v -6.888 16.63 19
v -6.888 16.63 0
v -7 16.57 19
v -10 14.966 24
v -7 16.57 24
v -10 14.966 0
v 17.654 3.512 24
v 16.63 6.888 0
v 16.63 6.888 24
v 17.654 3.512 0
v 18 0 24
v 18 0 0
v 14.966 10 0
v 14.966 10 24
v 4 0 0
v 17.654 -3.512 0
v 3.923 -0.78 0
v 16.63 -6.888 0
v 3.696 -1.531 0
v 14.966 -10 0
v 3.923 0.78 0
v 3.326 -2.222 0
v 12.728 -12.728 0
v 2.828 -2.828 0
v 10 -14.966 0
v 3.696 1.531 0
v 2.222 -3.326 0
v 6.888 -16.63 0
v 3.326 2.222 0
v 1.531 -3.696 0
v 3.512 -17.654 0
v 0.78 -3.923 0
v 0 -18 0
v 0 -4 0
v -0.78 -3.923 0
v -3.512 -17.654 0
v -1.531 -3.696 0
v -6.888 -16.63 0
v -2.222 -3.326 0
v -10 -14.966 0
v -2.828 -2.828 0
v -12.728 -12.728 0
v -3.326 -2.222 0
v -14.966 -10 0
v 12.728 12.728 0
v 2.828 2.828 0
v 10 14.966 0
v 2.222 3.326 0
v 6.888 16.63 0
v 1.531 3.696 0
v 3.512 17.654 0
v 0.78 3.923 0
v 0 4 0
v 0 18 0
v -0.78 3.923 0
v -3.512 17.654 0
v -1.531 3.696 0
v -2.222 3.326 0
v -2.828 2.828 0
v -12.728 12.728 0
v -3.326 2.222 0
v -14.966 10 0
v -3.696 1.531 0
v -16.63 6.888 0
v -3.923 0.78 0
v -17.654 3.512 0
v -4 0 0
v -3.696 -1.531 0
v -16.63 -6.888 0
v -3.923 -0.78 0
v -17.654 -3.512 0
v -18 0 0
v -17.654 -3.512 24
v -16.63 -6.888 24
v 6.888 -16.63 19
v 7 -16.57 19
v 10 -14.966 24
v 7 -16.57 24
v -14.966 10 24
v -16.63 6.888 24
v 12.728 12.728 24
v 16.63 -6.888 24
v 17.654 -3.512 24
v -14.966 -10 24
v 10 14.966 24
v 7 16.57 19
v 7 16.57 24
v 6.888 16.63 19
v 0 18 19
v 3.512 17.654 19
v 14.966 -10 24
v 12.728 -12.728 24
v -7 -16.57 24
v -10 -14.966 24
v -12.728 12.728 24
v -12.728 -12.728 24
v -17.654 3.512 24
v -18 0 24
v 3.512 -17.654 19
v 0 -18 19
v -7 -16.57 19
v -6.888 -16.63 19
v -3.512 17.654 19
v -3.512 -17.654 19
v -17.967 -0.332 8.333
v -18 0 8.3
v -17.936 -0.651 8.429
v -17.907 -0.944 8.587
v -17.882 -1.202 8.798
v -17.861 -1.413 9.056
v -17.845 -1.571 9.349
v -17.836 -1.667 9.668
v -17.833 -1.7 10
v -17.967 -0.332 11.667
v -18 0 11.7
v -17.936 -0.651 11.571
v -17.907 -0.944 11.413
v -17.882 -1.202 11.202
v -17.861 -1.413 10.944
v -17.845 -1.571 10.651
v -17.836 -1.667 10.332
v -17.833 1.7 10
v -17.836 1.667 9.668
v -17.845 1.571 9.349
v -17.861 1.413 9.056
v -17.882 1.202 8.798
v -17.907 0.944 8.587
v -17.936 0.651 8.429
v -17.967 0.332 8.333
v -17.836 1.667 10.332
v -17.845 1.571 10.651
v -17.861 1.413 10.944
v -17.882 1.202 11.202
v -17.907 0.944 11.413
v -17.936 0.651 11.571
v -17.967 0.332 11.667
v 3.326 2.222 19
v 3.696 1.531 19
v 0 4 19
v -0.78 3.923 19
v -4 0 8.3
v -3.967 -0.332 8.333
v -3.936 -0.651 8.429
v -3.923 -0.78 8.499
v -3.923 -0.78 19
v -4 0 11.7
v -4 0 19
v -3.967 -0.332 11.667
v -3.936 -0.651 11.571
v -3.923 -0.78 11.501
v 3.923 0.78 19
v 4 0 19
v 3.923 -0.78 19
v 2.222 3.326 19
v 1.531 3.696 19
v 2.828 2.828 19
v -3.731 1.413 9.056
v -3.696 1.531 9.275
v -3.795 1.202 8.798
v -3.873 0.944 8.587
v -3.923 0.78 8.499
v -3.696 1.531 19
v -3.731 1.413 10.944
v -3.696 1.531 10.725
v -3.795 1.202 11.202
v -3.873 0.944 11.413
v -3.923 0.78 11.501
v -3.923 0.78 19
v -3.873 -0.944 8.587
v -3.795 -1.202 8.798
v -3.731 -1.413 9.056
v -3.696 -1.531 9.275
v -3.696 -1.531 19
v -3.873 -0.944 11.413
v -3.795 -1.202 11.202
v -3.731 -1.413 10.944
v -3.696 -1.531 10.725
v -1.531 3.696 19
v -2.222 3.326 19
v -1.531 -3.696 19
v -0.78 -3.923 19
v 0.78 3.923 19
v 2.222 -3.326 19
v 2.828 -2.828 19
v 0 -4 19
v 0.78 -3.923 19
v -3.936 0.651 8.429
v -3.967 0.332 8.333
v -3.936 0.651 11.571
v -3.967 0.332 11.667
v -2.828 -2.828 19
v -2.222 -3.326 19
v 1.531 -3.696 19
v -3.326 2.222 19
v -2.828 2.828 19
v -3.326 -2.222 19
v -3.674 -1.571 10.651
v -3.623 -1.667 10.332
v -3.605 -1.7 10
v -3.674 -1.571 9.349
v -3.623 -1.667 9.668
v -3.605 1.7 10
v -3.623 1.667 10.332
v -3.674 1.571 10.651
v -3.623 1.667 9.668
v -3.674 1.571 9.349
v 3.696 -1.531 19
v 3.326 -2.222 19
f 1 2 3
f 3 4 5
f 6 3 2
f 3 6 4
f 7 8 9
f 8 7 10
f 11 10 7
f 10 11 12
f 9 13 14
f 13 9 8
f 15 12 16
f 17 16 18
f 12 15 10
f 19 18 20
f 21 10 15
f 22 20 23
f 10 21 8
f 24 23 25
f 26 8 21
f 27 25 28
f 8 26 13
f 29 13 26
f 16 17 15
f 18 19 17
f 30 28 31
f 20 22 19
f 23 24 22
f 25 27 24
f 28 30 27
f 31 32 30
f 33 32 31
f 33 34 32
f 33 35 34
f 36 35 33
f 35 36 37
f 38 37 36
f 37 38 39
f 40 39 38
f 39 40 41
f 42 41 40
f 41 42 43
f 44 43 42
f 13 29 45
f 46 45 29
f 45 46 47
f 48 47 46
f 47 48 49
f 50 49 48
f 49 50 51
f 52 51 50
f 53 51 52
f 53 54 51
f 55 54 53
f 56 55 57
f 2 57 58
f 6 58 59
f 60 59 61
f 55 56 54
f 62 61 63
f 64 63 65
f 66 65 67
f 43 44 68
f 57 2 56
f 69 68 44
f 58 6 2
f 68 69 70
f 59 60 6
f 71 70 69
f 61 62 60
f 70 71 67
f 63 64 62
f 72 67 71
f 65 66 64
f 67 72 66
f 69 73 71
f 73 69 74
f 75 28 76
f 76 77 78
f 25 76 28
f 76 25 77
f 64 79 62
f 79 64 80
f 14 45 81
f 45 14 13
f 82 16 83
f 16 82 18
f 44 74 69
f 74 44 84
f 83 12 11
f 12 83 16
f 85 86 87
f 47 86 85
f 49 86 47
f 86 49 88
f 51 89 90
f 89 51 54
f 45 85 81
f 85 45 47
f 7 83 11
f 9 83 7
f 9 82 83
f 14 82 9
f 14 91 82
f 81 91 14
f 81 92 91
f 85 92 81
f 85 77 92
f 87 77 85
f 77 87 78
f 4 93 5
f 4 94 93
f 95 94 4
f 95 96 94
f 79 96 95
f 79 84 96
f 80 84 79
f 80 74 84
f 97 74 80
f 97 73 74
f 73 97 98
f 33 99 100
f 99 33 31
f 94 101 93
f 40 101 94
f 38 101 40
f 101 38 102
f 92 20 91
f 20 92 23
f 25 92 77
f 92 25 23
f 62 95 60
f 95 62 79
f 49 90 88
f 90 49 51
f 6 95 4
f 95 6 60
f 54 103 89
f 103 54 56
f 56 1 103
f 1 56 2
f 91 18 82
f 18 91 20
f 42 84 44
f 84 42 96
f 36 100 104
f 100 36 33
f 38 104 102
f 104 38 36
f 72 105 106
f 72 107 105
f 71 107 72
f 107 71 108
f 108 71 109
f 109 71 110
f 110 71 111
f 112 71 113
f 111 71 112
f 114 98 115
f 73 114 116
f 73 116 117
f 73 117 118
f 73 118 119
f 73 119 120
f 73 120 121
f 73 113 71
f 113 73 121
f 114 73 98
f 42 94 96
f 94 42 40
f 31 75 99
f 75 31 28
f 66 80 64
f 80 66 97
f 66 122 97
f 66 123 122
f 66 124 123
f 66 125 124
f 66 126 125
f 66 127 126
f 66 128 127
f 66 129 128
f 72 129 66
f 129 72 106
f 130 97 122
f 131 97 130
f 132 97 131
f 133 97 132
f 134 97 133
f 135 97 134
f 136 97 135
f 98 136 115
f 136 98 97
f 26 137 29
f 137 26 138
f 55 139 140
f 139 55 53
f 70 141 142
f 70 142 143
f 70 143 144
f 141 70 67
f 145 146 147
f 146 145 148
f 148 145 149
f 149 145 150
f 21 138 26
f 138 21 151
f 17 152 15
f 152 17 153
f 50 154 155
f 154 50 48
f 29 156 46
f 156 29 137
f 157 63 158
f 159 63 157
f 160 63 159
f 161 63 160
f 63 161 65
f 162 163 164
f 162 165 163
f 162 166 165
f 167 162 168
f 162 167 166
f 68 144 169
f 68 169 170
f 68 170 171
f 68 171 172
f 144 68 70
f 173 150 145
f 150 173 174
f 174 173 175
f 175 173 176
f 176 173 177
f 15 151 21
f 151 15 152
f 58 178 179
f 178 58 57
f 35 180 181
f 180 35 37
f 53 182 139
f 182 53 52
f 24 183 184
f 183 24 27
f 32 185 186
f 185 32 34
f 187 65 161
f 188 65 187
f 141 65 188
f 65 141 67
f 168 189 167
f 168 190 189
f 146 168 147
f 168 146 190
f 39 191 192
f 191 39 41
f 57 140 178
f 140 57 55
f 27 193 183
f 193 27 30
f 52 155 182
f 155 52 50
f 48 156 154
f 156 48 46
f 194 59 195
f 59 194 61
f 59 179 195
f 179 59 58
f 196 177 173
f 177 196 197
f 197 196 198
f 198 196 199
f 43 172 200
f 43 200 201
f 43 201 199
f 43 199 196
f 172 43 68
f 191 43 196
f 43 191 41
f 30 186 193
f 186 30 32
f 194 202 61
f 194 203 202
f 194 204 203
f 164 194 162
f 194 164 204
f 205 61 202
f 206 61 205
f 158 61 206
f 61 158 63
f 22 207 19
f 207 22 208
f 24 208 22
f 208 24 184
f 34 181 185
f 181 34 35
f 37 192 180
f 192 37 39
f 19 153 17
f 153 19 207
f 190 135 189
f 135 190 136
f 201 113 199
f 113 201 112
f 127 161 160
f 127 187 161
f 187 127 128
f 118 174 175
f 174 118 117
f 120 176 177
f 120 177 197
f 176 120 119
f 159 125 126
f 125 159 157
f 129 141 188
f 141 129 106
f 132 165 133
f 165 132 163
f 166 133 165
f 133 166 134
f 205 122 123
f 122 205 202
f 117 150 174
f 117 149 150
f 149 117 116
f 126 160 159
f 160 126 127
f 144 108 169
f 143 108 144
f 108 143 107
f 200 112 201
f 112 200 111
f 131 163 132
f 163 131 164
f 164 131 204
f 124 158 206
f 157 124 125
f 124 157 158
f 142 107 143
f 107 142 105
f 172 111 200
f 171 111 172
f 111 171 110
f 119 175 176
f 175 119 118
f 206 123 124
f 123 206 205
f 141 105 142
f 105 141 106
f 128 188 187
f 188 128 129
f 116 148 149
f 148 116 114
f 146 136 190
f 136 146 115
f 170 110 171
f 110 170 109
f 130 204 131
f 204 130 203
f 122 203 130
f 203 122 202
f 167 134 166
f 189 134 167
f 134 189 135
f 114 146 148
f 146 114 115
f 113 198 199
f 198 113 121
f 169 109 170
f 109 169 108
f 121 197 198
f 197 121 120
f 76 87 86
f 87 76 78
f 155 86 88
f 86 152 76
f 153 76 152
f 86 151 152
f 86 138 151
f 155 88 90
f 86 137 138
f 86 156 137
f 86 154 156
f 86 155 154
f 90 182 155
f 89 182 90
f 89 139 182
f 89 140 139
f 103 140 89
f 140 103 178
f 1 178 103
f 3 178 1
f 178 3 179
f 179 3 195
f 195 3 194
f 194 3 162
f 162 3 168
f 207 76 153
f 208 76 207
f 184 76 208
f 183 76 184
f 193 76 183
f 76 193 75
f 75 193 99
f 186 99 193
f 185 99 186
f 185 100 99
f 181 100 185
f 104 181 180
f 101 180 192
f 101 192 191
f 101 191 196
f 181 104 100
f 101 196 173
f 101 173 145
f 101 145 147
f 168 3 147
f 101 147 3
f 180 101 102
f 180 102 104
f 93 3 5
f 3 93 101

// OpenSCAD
$fn = 32;

// ----------------------------------------------------------------------
// Oldham coupling hub: 36 x 24 mm
// ----------------------------------------------------------------------

// --- parameters (mm) ---
body_d = 36;              // hub diameter
body_l = 20;              // hub length
shaft_d = 8;              // shaft bore
cam_w = 14;               // drive tongue width
tongue_h = 4;             // drive tongue height
set_d = 3.4;              // set screw tap hole

module hub() {
  /* the slot side is a raised disc with a groove milled across it */
  cylinder(h = body_l + tongue_h, d = body_d);
}

difference() {
  hub();
  translate([0, 0, -1]) cylinder(h = body_l + tongue_h + 2, d = shaft_d);
  translate([-body_d / 2 - 1, 0, body_l * 0.5])
    rotate([0, 90, 0]) cylinder(h = body_d / 2 + 2, d = set_d);
  translate([-cam_w / 2, -body_d / 2 - 1, body_l - 1])
    cube([cam_w, body_d + 2, tongue_h + 1]);
}
